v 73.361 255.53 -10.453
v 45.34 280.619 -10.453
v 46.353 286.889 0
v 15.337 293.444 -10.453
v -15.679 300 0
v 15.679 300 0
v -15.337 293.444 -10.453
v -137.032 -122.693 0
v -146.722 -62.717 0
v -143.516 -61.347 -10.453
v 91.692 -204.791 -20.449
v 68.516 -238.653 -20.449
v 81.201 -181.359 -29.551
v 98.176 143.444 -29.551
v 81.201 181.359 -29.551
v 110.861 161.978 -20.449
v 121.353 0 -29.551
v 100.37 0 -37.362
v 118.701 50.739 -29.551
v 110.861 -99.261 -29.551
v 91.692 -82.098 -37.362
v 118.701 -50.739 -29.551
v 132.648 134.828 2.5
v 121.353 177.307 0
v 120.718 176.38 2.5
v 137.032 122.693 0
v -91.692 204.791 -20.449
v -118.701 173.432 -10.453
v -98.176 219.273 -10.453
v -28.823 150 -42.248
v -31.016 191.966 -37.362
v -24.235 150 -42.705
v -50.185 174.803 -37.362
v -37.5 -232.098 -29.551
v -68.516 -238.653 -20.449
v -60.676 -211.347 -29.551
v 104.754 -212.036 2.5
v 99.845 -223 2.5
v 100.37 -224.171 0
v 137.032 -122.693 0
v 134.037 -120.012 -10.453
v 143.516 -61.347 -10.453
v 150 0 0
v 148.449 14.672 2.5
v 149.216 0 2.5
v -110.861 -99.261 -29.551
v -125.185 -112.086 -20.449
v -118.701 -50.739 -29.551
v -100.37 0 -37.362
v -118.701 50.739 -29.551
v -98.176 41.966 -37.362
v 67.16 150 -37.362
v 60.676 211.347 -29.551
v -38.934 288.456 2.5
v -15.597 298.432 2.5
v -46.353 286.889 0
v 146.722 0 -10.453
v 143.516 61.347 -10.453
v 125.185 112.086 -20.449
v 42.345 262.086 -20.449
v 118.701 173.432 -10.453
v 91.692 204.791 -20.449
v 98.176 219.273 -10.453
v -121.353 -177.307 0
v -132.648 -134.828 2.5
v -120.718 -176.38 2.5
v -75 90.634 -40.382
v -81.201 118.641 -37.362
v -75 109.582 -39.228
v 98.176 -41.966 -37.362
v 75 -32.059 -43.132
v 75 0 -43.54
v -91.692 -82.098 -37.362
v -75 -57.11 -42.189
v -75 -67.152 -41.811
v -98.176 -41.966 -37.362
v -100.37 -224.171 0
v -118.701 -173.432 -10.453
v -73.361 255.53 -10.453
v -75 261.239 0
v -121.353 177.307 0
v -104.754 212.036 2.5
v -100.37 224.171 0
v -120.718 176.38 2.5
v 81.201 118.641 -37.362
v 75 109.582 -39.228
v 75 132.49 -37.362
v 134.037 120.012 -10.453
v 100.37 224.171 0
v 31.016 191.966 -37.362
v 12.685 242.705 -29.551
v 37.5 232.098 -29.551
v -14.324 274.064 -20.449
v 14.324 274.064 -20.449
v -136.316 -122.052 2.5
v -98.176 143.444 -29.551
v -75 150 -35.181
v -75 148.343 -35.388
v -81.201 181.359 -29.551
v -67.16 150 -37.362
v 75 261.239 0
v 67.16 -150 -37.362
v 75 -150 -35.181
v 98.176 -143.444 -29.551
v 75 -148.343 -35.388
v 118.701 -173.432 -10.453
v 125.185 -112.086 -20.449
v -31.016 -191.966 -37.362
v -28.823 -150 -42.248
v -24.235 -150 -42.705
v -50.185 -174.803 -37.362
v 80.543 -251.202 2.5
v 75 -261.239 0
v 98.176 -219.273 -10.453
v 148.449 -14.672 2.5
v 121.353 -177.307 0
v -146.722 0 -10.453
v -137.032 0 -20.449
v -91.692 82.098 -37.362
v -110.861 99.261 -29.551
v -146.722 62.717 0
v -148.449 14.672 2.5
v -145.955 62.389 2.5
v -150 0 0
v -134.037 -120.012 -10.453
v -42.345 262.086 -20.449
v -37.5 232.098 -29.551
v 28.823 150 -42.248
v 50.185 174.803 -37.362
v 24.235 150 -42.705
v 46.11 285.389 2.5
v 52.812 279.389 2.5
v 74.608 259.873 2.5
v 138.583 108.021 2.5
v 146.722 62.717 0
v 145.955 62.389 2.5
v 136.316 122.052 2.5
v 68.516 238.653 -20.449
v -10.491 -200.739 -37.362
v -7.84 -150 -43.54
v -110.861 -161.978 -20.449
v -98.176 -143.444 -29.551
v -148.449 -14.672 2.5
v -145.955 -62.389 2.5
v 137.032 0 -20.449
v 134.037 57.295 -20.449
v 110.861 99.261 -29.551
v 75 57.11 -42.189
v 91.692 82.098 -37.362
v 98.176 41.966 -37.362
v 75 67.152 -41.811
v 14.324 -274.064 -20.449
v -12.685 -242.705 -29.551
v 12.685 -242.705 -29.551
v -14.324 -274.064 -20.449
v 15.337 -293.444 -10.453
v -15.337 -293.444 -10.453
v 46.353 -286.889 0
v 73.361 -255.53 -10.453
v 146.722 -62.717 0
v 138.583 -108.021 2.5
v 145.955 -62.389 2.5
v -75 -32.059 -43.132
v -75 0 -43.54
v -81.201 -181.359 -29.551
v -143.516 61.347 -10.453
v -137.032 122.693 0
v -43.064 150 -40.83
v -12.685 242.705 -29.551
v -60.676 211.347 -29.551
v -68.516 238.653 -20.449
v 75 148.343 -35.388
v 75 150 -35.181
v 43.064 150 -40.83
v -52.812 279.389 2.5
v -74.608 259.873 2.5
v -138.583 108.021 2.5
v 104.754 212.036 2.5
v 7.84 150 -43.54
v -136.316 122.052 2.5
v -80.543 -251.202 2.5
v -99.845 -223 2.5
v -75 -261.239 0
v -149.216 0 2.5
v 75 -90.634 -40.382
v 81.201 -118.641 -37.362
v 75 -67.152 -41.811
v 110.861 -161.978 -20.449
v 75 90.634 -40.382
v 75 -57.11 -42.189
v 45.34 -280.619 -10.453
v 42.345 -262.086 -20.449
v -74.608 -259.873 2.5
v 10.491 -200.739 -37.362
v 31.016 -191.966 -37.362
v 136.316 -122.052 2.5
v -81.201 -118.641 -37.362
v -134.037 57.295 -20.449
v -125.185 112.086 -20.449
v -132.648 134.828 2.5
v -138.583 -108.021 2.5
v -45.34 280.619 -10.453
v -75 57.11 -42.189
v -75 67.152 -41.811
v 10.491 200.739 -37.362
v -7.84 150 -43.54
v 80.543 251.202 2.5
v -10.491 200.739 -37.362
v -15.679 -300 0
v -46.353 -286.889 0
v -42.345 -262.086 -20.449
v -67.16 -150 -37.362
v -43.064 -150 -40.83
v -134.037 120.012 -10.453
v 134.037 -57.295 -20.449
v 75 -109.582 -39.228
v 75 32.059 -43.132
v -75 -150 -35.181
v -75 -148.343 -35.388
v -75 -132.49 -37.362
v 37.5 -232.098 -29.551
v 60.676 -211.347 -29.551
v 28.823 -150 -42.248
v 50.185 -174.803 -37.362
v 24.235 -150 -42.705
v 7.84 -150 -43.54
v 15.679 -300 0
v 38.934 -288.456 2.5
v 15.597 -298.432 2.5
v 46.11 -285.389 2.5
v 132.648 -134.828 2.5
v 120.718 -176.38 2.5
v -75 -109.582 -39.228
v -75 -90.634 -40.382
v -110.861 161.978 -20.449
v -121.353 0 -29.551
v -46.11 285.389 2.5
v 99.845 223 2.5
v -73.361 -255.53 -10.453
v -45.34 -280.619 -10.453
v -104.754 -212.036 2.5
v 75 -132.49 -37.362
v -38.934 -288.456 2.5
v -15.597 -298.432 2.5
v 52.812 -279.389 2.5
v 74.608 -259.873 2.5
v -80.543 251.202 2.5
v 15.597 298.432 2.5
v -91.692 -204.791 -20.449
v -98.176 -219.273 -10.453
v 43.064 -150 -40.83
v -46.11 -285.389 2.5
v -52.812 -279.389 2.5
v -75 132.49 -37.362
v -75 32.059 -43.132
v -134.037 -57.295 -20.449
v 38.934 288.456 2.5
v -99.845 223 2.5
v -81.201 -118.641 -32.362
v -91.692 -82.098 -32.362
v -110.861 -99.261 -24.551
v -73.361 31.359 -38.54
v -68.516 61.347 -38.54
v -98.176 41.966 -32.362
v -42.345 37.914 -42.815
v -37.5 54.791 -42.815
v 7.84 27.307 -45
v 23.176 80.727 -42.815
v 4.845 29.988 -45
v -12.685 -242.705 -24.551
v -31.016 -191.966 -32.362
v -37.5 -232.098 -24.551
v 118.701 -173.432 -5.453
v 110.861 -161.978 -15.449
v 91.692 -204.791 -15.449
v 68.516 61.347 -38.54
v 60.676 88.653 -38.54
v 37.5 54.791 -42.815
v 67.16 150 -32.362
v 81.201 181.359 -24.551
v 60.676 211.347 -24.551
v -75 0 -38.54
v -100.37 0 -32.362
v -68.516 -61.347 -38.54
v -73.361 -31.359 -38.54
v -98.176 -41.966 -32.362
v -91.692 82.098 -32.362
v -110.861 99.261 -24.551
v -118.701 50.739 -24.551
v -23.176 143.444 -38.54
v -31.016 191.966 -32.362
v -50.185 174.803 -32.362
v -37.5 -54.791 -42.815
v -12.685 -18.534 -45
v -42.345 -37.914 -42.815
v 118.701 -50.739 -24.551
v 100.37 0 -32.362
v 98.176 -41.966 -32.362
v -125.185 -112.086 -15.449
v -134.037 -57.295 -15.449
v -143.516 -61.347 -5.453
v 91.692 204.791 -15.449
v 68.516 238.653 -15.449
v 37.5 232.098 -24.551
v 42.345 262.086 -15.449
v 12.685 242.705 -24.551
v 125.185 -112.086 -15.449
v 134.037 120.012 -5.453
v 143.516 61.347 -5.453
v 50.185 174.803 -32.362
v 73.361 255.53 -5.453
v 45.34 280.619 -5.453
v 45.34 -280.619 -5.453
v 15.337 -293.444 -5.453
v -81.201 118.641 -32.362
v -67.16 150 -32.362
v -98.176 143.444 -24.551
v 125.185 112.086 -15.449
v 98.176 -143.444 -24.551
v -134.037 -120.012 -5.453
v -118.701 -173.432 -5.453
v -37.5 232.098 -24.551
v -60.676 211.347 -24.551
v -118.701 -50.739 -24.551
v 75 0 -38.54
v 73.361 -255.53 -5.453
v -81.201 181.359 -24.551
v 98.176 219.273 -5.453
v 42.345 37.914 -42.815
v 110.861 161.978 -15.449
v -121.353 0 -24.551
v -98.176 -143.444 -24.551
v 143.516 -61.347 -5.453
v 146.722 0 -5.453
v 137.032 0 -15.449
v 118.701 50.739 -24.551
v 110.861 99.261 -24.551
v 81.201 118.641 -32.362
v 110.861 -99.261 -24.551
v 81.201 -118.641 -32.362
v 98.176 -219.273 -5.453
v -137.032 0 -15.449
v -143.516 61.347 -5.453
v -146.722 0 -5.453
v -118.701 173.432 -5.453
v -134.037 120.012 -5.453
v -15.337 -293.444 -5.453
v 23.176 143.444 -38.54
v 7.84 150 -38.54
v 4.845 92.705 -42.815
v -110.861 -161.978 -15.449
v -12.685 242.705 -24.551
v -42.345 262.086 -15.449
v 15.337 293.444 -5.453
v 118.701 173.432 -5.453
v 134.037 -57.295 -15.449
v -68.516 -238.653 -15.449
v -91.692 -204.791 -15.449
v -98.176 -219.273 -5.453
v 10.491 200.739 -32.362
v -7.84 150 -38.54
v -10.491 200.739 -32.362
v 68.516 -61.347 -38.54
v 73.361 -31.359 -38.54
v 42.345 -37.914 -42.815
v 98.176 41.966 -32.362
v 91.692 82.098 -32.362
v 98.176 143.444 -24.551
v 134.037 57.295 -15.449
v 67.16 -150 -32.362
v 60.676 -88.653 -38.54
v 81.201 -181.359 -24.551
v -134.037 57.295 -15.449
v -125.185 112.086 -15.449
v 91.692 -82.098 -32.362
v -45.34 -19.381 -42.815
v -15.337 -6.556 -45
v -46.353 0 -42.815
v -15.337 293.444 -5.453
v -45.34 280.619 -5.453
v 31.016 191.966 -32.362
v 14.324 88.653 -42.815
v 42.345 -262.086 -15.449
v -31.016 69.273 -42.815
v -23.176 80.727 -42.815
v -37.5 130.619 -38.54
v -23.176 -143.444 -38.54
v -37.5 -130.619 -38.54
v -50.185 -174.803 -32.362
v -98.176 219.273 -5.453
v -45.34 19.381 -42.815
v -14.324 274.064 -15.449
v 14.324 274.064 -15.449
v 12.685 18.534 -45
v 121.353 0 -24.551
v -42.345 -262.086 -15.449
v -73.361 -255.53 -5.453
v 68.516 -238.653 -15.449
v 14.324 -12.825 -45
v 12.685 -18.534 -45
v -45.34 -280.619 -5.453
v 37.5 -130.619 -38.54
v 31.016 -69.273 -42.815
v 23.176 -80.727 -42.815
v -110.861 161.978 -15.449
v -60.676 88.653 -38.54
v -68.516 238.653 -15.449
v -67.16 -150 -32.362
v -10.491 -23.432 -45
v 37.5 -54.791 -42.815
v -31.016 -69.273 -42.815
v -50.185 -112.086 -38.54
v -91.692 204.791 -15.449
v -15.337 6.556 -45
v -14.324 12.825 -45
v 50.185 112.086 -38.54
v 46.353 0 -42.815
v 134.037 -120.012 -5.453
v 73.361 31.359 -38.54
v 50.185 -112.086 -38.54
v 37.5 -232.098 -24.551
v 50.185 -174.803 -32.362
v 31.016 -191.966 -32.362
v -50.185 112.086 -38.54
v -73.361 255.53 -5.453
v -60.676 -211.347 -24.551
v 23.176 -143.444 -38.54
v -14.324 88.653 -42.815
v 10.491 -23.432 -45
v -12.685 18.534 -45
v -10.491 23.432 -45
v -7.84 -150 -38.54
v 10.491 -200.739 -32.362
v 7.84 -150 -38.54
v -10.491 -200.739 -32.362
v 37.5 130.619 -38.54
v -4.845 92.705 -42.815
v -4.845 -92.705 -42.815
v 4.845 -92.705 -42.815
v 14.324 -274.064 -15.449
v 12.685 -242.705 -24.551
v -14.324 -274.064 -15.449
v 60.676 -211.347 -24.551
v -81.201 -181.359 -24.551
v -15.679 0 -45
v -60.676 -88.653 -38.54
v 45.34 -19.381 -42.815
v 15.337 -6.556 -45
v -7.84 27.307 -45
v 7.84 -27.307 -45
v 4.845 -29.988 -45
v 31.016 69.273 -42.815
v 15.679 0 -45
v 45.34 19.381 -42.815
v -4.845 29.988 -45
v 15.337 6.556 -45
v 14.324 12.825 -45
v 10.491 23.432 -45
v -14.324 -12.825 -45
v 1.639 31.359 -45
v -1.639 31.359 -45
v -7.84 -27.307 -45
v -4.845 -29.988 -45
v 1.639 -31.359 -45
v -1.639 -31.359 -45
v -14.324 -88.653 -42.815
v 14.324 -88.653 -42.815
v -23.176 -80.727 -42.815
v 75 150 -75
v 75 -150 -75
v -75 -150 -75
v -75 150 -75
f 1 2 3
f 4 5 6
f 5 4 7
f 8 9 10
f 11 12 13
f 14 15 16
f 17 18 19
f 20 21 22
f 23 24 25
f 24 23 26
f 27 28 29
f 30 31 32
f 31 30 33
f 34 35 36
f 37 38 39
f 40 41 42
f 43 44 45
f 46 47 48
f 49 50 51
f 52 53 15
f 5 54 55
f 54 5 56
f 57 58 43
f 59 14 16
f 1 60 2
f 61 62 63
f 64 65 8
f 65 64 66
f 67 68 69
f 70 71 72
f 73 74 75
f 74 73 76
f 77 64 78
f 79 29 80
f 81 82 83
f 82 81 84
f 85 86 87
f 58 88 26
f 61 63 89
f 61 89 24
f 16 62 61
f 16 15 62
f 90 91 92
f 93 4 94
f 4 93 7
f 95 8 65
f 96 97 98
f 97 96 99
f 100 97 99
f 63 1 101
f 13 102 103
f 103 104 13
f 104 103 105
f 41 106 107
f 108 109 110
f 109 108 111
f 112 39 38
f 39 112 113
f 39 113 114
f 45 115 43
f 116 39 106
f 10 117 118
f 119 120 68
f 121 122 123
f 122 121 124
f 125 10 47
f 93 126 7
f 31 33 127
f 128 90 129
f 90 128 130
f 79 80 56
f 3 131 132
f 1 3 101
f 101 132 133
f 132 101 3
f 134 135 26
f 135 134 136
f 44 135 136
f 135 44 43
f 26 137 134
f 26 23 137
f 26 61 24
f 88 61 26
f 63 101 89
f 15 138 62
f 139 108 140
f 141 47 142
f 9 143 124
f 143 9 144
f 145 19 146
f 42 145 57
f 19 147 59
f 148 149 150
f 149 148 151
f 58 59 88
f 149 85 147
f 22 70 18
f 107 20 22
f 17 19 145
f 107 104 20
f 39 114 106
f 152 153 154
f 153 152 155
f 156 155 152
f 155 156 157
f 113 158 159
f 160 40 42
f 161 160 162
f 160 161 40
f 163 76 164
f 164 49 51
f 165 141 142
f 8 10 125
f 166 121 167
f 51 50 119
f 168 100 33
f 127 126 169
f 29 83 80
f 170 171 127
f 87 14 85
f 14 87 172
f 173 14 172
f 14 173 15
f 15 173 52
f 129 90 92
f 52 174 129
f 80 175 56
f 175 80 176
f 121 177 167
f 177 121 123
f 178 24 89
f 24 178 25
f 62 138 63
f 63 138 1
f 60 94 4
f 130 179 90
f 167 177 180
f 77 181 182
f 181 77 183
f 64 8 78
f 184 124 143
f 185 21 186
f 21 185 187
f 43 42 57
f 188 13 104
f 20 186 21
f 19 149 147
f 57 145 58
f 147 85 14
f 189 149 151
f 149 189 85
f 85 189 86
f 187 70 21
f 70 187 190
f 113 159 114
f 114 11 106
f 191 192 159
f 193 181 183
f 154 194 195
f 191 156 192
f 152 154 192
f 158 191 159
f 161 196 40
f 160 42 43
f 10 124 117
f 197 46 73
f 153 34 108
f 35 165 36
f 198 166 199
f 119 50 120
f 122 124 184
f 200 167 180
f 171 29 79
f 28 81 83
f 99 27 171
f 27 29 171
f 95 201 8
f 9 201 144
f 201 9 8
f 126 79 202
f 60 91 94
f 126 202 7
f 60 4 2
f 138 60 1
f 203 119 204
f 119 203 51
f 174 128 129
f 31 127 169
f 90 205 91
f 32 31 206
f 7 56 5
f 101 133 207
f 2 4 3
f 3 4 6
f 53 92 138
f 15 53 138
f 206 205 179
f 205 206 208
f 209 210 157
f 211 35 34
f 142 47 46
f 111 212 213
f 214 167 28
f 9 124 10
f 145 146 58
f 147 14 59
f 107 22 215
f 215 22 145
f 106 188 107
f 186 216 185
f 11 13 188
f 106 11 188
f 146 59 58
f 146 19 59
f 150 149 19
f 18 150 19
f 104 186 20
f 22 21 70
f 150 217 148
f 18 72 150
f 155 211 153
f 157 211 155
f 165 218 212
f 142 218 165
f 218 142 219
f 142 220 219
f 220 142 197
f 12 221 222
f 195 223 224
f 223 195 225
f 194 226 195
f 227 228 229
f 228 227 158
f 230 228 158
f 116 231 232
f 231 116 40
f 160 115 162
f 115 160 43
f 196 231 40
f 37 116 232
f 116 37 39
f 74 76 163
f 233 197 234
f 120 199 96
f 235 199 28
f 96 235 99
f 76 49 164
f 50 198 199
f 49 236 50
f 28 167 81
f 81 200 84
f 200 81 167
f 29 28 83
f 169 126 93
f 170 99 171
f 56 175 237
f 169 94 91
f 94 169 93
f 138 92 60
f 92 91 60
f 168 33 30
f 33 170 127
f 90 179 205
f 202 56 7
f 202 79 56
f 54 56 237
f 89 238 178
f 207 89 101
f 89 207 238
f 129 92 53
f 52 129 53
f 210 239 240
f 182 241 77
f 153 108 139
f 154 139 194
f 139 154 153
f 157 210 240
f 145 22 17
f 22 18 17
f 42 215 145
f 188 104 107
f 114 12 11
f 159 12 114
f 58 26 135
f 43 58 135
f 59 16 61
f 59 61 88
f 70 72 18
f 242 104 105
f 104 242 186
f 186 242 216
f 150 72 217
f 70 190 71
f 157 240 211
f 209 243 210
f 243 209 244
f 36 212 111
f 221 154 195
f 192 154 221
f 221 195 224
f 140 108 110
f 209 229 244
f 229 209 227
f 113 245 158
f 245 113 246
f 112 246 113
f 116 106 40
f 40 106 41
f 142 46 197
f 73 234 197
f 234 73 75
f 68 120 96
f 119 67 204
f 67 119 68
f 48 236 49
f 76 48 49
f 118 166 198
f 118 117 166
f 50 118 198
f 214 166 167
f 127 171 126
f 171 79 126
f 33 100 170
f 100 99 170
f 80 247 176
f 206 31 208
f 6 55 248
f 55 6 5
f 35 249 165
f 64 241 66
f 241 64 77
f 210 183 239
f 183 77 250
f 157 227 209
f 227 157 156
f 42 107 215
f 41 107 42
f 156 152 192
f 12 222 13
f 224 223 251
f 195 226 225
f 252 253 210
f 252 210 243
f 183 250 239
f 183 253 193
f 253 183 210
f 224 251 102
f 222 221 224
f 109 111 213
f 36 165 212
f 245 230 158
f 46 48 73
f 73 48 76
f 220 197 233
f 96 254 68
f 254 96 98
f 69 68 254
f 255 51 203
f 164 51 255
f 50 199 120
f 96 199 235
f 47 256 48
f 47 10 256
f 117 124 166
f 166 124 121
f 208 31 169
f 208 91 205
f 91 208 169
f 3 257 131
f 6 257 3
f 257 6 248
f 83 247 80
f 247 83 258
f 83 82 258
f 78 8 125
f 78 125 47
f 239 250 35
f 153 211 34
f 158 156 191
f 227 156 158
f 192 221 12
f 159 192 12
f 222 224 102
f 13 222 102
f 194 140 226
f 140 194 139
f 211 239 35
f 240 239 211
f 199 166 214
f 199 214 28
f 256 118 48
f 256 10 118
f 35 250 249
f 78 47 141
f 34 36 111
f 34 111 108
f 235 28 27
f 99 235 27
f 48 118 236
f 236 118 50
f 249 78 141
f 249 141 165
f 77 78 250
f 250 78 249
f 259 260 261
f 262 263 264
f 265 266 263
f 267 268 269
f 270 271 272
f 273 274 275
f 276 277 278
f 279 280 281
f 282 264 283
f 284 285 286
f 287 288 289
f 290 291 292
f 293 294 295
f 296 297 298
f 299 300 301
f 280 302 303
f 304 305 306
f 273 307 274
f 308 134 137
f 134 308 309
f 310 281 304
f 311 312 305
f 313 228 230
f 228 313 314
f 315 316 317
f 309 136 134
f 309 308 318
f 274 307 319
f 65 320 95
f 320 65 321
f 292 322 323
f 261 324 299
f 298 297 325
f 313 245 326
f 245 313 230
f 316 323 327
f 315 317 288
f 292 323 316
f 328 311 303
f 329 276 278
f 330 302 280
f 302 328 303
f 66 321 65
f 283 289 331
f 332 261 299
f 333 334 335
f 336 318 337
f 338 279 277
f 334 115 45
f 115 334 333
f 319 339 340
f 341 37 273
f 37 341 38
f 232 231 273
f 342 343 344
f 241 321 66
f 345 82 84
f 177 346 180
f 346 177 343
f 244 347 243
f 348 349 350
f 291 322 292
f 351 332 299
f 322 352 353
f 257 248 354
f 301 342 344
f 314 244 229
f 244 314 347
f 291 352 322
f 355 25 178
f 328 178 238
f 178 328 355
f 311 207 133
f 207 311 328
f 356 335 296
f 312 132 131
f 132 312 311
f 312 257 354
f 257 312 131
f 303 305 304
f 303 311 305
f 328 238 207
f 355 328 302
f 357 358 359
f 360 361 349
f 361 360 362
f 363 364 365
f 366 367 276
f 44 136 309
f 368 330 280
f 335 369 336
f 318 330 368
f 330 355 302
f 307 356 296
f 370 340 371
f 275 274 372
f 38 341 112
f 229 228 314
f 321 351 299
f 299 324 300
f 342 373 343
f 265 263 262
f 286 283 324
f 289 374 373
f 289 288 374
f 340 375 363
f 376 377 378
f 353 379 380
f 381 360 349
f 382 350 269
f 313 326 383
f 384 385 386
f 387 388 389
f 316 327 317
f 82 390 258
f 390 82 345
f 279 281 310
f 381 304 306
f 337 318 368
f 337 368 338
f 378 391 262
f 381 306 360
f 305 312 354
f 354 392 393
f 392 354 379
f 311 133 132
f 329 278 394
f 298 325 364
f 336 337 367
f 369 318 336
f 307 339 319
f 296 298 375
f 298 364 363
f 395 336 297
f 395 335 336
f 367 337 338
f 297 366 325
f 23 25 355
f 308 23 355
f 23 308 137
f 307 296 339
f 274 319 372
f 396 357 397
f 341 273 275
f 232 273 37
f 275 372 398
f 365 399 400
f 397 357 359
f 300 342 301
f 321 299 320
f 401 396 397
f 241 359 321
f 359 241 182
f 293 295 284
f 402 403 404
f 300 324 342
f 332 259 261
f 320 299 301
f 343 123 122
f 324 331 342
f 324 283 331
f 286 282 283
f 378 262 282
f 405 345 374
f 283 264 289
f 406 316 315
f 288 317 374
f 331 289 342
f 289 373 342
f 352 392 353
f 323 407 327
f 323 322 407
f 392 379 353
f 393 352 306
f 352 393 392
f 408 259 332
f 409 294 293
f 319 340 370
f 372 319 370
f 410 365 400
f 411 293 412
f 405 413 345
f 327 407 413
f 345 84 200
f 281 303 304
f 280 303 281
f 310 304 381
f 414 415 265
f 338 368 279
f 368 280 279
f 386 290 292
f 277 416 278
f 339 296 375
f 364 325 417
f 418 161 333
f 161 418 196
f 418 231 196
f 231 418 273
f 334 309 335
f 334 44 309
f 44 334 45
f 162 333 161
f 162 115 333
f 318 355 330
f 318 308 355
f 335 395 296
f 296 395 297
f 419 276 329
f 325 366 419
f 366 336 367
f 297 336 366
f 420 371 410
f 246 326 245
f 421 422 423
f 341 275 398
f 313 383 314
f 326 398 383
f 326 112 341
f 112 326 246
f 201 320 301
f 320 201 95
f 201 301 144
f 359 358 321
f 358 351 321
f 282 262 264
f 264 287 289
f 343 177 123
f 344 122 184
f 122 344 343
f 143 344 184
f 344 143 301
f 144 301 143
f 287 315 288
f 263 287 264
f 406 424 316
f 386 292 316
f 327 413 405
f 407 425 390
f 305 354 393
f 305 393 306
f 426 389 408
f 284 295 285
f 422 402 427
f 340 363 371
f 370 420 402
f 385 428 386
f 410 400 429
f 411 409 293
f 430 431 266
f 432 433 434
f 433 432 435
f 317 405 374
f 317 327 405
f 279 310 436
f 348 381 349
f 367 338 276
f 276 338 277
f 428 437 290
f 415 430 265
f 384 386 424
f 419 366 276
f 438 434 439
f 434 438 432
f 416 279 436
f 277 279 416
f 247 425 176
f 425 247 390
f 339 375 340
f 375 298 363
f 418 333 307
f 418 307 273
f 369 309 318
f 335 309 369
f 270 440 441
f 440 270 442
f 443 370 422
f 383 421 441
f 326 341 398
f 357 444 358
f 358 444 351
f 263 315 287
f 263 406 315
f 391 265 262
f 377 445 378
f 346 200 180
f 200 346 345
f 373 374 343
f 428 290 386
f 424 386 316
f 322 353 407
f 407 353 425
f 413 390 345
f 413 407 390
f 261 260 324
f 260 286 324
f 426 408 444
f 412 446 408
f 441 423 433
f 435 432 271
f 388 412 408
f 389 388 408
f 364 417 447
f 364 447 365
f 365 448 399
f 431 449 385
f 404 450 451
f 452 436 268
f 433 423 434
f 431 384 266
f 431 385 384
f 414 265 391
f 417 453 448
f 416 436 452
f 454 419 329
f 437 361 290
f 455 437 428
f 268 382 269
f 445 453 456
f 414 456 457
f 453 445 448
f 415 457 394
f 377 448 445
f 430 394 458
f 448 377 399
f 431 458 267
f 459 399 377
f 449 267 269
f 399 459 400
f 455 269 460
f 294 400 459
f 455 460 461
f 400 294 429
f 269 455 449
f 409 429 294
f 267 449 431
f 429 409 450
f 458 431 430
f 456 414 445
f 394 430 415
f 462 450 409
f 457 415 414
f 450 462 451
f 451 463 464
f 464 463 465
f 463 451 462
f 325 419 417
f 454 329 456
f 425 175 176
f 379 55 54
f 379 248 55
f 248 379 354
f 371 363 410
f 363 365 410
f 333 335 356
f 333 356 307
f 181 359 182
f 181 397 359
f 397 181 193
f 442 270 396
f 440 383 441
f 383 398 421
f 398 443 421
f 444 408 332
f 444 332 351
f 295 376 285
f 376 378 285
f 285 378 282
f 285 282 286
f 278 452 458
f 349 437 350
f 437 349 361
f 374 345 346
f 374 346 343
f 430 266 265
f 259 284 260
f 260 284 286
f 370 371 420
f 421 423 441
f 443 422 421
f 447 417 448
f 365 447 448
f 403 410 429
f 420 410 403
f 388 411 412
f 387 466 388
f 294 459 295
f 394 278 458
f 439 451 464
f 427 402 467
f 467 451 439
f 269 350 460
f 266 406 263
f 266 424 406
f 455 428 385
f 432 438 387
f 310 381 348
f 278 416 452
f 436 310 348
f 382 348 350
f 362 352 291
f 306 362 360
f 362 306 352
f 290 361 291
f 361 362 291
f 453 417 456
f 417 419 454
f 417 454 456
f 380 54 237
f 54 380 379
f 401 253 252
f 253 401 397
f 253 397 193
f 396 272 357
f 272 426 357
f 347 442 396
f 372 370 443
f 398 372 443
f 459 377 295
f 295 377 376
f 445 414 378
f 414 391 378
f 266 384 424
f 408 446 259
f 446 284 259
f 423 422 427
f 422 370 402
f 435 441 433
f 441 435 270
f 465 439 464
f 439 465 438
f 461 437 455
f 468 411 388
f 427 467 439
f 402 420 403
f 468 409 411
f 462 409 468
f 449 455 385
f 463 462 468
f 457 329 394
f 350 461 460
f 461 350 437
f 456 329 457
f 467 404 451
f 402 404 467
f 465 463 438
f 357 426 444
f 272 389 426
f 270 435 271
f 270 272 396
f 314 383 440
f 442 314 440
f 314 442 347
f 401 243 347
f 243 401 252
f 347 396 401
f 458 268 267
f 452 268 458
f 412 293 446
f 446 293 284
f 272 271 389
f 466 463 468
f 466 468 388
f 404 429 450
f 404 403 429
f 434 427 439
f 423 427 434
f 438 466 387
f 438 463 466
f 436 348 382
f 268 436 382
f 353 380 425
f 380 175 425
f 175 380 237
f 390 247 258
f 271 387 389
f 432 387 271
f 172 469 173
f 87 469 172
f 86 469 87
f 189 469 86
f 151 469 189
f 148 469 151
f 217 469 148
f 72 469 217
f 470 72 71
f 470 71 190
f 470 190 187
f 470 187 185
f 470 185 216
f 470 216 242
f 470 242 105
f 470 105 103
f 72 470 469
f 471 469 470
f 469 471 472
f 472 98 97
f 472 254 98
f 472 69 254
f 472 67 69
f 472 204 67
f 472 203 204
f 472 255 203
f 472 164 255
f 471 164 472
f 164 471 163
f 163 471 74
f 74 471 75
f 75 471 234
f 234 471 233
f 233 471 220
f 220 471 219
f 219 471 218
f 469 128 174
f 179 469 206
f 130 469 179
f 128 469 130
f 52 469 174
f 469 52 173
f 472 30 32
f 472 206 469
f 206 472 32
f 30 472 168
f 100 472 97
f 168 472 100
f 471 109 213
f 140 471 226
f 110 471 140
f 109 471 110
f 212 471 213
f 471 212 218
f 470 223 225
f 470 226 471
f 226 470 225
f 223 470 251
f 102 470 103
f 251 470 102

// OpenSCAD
// Bowl Width
bowlWidth = 300; // [50:500]
// Bowl Height
bowlHeight= 600; // [50:500]
// Bowl Thickness
bowlThickness = 100; // [50:500]

footWidth = bowlWidth/2;
footHeight = bowlHeight/2;
footThickness = bowlThickness/2;

//module createBowl() {
	difference() {
		resize(newsize=[bowlWidth, bowlHeight, bowlThickness]) sphere(r=10);
		translate([0,0,5]) resize(newsize=[bowlWidth, bowlHeight, bowlThickness]) sphere(r=10); 
	}
//}	

//module createFoot() {
	difference() {
		translate([-footWidth/2, -footHeight/2, -3/2*footThickness]) cube([footWidth, footHeight, footThickness]);
		resize(newsize=[bowlWidth, bowlHeight, bowlThickness]) sphere(r=10);
	}
//}


//createBowl();
//createFoot();
